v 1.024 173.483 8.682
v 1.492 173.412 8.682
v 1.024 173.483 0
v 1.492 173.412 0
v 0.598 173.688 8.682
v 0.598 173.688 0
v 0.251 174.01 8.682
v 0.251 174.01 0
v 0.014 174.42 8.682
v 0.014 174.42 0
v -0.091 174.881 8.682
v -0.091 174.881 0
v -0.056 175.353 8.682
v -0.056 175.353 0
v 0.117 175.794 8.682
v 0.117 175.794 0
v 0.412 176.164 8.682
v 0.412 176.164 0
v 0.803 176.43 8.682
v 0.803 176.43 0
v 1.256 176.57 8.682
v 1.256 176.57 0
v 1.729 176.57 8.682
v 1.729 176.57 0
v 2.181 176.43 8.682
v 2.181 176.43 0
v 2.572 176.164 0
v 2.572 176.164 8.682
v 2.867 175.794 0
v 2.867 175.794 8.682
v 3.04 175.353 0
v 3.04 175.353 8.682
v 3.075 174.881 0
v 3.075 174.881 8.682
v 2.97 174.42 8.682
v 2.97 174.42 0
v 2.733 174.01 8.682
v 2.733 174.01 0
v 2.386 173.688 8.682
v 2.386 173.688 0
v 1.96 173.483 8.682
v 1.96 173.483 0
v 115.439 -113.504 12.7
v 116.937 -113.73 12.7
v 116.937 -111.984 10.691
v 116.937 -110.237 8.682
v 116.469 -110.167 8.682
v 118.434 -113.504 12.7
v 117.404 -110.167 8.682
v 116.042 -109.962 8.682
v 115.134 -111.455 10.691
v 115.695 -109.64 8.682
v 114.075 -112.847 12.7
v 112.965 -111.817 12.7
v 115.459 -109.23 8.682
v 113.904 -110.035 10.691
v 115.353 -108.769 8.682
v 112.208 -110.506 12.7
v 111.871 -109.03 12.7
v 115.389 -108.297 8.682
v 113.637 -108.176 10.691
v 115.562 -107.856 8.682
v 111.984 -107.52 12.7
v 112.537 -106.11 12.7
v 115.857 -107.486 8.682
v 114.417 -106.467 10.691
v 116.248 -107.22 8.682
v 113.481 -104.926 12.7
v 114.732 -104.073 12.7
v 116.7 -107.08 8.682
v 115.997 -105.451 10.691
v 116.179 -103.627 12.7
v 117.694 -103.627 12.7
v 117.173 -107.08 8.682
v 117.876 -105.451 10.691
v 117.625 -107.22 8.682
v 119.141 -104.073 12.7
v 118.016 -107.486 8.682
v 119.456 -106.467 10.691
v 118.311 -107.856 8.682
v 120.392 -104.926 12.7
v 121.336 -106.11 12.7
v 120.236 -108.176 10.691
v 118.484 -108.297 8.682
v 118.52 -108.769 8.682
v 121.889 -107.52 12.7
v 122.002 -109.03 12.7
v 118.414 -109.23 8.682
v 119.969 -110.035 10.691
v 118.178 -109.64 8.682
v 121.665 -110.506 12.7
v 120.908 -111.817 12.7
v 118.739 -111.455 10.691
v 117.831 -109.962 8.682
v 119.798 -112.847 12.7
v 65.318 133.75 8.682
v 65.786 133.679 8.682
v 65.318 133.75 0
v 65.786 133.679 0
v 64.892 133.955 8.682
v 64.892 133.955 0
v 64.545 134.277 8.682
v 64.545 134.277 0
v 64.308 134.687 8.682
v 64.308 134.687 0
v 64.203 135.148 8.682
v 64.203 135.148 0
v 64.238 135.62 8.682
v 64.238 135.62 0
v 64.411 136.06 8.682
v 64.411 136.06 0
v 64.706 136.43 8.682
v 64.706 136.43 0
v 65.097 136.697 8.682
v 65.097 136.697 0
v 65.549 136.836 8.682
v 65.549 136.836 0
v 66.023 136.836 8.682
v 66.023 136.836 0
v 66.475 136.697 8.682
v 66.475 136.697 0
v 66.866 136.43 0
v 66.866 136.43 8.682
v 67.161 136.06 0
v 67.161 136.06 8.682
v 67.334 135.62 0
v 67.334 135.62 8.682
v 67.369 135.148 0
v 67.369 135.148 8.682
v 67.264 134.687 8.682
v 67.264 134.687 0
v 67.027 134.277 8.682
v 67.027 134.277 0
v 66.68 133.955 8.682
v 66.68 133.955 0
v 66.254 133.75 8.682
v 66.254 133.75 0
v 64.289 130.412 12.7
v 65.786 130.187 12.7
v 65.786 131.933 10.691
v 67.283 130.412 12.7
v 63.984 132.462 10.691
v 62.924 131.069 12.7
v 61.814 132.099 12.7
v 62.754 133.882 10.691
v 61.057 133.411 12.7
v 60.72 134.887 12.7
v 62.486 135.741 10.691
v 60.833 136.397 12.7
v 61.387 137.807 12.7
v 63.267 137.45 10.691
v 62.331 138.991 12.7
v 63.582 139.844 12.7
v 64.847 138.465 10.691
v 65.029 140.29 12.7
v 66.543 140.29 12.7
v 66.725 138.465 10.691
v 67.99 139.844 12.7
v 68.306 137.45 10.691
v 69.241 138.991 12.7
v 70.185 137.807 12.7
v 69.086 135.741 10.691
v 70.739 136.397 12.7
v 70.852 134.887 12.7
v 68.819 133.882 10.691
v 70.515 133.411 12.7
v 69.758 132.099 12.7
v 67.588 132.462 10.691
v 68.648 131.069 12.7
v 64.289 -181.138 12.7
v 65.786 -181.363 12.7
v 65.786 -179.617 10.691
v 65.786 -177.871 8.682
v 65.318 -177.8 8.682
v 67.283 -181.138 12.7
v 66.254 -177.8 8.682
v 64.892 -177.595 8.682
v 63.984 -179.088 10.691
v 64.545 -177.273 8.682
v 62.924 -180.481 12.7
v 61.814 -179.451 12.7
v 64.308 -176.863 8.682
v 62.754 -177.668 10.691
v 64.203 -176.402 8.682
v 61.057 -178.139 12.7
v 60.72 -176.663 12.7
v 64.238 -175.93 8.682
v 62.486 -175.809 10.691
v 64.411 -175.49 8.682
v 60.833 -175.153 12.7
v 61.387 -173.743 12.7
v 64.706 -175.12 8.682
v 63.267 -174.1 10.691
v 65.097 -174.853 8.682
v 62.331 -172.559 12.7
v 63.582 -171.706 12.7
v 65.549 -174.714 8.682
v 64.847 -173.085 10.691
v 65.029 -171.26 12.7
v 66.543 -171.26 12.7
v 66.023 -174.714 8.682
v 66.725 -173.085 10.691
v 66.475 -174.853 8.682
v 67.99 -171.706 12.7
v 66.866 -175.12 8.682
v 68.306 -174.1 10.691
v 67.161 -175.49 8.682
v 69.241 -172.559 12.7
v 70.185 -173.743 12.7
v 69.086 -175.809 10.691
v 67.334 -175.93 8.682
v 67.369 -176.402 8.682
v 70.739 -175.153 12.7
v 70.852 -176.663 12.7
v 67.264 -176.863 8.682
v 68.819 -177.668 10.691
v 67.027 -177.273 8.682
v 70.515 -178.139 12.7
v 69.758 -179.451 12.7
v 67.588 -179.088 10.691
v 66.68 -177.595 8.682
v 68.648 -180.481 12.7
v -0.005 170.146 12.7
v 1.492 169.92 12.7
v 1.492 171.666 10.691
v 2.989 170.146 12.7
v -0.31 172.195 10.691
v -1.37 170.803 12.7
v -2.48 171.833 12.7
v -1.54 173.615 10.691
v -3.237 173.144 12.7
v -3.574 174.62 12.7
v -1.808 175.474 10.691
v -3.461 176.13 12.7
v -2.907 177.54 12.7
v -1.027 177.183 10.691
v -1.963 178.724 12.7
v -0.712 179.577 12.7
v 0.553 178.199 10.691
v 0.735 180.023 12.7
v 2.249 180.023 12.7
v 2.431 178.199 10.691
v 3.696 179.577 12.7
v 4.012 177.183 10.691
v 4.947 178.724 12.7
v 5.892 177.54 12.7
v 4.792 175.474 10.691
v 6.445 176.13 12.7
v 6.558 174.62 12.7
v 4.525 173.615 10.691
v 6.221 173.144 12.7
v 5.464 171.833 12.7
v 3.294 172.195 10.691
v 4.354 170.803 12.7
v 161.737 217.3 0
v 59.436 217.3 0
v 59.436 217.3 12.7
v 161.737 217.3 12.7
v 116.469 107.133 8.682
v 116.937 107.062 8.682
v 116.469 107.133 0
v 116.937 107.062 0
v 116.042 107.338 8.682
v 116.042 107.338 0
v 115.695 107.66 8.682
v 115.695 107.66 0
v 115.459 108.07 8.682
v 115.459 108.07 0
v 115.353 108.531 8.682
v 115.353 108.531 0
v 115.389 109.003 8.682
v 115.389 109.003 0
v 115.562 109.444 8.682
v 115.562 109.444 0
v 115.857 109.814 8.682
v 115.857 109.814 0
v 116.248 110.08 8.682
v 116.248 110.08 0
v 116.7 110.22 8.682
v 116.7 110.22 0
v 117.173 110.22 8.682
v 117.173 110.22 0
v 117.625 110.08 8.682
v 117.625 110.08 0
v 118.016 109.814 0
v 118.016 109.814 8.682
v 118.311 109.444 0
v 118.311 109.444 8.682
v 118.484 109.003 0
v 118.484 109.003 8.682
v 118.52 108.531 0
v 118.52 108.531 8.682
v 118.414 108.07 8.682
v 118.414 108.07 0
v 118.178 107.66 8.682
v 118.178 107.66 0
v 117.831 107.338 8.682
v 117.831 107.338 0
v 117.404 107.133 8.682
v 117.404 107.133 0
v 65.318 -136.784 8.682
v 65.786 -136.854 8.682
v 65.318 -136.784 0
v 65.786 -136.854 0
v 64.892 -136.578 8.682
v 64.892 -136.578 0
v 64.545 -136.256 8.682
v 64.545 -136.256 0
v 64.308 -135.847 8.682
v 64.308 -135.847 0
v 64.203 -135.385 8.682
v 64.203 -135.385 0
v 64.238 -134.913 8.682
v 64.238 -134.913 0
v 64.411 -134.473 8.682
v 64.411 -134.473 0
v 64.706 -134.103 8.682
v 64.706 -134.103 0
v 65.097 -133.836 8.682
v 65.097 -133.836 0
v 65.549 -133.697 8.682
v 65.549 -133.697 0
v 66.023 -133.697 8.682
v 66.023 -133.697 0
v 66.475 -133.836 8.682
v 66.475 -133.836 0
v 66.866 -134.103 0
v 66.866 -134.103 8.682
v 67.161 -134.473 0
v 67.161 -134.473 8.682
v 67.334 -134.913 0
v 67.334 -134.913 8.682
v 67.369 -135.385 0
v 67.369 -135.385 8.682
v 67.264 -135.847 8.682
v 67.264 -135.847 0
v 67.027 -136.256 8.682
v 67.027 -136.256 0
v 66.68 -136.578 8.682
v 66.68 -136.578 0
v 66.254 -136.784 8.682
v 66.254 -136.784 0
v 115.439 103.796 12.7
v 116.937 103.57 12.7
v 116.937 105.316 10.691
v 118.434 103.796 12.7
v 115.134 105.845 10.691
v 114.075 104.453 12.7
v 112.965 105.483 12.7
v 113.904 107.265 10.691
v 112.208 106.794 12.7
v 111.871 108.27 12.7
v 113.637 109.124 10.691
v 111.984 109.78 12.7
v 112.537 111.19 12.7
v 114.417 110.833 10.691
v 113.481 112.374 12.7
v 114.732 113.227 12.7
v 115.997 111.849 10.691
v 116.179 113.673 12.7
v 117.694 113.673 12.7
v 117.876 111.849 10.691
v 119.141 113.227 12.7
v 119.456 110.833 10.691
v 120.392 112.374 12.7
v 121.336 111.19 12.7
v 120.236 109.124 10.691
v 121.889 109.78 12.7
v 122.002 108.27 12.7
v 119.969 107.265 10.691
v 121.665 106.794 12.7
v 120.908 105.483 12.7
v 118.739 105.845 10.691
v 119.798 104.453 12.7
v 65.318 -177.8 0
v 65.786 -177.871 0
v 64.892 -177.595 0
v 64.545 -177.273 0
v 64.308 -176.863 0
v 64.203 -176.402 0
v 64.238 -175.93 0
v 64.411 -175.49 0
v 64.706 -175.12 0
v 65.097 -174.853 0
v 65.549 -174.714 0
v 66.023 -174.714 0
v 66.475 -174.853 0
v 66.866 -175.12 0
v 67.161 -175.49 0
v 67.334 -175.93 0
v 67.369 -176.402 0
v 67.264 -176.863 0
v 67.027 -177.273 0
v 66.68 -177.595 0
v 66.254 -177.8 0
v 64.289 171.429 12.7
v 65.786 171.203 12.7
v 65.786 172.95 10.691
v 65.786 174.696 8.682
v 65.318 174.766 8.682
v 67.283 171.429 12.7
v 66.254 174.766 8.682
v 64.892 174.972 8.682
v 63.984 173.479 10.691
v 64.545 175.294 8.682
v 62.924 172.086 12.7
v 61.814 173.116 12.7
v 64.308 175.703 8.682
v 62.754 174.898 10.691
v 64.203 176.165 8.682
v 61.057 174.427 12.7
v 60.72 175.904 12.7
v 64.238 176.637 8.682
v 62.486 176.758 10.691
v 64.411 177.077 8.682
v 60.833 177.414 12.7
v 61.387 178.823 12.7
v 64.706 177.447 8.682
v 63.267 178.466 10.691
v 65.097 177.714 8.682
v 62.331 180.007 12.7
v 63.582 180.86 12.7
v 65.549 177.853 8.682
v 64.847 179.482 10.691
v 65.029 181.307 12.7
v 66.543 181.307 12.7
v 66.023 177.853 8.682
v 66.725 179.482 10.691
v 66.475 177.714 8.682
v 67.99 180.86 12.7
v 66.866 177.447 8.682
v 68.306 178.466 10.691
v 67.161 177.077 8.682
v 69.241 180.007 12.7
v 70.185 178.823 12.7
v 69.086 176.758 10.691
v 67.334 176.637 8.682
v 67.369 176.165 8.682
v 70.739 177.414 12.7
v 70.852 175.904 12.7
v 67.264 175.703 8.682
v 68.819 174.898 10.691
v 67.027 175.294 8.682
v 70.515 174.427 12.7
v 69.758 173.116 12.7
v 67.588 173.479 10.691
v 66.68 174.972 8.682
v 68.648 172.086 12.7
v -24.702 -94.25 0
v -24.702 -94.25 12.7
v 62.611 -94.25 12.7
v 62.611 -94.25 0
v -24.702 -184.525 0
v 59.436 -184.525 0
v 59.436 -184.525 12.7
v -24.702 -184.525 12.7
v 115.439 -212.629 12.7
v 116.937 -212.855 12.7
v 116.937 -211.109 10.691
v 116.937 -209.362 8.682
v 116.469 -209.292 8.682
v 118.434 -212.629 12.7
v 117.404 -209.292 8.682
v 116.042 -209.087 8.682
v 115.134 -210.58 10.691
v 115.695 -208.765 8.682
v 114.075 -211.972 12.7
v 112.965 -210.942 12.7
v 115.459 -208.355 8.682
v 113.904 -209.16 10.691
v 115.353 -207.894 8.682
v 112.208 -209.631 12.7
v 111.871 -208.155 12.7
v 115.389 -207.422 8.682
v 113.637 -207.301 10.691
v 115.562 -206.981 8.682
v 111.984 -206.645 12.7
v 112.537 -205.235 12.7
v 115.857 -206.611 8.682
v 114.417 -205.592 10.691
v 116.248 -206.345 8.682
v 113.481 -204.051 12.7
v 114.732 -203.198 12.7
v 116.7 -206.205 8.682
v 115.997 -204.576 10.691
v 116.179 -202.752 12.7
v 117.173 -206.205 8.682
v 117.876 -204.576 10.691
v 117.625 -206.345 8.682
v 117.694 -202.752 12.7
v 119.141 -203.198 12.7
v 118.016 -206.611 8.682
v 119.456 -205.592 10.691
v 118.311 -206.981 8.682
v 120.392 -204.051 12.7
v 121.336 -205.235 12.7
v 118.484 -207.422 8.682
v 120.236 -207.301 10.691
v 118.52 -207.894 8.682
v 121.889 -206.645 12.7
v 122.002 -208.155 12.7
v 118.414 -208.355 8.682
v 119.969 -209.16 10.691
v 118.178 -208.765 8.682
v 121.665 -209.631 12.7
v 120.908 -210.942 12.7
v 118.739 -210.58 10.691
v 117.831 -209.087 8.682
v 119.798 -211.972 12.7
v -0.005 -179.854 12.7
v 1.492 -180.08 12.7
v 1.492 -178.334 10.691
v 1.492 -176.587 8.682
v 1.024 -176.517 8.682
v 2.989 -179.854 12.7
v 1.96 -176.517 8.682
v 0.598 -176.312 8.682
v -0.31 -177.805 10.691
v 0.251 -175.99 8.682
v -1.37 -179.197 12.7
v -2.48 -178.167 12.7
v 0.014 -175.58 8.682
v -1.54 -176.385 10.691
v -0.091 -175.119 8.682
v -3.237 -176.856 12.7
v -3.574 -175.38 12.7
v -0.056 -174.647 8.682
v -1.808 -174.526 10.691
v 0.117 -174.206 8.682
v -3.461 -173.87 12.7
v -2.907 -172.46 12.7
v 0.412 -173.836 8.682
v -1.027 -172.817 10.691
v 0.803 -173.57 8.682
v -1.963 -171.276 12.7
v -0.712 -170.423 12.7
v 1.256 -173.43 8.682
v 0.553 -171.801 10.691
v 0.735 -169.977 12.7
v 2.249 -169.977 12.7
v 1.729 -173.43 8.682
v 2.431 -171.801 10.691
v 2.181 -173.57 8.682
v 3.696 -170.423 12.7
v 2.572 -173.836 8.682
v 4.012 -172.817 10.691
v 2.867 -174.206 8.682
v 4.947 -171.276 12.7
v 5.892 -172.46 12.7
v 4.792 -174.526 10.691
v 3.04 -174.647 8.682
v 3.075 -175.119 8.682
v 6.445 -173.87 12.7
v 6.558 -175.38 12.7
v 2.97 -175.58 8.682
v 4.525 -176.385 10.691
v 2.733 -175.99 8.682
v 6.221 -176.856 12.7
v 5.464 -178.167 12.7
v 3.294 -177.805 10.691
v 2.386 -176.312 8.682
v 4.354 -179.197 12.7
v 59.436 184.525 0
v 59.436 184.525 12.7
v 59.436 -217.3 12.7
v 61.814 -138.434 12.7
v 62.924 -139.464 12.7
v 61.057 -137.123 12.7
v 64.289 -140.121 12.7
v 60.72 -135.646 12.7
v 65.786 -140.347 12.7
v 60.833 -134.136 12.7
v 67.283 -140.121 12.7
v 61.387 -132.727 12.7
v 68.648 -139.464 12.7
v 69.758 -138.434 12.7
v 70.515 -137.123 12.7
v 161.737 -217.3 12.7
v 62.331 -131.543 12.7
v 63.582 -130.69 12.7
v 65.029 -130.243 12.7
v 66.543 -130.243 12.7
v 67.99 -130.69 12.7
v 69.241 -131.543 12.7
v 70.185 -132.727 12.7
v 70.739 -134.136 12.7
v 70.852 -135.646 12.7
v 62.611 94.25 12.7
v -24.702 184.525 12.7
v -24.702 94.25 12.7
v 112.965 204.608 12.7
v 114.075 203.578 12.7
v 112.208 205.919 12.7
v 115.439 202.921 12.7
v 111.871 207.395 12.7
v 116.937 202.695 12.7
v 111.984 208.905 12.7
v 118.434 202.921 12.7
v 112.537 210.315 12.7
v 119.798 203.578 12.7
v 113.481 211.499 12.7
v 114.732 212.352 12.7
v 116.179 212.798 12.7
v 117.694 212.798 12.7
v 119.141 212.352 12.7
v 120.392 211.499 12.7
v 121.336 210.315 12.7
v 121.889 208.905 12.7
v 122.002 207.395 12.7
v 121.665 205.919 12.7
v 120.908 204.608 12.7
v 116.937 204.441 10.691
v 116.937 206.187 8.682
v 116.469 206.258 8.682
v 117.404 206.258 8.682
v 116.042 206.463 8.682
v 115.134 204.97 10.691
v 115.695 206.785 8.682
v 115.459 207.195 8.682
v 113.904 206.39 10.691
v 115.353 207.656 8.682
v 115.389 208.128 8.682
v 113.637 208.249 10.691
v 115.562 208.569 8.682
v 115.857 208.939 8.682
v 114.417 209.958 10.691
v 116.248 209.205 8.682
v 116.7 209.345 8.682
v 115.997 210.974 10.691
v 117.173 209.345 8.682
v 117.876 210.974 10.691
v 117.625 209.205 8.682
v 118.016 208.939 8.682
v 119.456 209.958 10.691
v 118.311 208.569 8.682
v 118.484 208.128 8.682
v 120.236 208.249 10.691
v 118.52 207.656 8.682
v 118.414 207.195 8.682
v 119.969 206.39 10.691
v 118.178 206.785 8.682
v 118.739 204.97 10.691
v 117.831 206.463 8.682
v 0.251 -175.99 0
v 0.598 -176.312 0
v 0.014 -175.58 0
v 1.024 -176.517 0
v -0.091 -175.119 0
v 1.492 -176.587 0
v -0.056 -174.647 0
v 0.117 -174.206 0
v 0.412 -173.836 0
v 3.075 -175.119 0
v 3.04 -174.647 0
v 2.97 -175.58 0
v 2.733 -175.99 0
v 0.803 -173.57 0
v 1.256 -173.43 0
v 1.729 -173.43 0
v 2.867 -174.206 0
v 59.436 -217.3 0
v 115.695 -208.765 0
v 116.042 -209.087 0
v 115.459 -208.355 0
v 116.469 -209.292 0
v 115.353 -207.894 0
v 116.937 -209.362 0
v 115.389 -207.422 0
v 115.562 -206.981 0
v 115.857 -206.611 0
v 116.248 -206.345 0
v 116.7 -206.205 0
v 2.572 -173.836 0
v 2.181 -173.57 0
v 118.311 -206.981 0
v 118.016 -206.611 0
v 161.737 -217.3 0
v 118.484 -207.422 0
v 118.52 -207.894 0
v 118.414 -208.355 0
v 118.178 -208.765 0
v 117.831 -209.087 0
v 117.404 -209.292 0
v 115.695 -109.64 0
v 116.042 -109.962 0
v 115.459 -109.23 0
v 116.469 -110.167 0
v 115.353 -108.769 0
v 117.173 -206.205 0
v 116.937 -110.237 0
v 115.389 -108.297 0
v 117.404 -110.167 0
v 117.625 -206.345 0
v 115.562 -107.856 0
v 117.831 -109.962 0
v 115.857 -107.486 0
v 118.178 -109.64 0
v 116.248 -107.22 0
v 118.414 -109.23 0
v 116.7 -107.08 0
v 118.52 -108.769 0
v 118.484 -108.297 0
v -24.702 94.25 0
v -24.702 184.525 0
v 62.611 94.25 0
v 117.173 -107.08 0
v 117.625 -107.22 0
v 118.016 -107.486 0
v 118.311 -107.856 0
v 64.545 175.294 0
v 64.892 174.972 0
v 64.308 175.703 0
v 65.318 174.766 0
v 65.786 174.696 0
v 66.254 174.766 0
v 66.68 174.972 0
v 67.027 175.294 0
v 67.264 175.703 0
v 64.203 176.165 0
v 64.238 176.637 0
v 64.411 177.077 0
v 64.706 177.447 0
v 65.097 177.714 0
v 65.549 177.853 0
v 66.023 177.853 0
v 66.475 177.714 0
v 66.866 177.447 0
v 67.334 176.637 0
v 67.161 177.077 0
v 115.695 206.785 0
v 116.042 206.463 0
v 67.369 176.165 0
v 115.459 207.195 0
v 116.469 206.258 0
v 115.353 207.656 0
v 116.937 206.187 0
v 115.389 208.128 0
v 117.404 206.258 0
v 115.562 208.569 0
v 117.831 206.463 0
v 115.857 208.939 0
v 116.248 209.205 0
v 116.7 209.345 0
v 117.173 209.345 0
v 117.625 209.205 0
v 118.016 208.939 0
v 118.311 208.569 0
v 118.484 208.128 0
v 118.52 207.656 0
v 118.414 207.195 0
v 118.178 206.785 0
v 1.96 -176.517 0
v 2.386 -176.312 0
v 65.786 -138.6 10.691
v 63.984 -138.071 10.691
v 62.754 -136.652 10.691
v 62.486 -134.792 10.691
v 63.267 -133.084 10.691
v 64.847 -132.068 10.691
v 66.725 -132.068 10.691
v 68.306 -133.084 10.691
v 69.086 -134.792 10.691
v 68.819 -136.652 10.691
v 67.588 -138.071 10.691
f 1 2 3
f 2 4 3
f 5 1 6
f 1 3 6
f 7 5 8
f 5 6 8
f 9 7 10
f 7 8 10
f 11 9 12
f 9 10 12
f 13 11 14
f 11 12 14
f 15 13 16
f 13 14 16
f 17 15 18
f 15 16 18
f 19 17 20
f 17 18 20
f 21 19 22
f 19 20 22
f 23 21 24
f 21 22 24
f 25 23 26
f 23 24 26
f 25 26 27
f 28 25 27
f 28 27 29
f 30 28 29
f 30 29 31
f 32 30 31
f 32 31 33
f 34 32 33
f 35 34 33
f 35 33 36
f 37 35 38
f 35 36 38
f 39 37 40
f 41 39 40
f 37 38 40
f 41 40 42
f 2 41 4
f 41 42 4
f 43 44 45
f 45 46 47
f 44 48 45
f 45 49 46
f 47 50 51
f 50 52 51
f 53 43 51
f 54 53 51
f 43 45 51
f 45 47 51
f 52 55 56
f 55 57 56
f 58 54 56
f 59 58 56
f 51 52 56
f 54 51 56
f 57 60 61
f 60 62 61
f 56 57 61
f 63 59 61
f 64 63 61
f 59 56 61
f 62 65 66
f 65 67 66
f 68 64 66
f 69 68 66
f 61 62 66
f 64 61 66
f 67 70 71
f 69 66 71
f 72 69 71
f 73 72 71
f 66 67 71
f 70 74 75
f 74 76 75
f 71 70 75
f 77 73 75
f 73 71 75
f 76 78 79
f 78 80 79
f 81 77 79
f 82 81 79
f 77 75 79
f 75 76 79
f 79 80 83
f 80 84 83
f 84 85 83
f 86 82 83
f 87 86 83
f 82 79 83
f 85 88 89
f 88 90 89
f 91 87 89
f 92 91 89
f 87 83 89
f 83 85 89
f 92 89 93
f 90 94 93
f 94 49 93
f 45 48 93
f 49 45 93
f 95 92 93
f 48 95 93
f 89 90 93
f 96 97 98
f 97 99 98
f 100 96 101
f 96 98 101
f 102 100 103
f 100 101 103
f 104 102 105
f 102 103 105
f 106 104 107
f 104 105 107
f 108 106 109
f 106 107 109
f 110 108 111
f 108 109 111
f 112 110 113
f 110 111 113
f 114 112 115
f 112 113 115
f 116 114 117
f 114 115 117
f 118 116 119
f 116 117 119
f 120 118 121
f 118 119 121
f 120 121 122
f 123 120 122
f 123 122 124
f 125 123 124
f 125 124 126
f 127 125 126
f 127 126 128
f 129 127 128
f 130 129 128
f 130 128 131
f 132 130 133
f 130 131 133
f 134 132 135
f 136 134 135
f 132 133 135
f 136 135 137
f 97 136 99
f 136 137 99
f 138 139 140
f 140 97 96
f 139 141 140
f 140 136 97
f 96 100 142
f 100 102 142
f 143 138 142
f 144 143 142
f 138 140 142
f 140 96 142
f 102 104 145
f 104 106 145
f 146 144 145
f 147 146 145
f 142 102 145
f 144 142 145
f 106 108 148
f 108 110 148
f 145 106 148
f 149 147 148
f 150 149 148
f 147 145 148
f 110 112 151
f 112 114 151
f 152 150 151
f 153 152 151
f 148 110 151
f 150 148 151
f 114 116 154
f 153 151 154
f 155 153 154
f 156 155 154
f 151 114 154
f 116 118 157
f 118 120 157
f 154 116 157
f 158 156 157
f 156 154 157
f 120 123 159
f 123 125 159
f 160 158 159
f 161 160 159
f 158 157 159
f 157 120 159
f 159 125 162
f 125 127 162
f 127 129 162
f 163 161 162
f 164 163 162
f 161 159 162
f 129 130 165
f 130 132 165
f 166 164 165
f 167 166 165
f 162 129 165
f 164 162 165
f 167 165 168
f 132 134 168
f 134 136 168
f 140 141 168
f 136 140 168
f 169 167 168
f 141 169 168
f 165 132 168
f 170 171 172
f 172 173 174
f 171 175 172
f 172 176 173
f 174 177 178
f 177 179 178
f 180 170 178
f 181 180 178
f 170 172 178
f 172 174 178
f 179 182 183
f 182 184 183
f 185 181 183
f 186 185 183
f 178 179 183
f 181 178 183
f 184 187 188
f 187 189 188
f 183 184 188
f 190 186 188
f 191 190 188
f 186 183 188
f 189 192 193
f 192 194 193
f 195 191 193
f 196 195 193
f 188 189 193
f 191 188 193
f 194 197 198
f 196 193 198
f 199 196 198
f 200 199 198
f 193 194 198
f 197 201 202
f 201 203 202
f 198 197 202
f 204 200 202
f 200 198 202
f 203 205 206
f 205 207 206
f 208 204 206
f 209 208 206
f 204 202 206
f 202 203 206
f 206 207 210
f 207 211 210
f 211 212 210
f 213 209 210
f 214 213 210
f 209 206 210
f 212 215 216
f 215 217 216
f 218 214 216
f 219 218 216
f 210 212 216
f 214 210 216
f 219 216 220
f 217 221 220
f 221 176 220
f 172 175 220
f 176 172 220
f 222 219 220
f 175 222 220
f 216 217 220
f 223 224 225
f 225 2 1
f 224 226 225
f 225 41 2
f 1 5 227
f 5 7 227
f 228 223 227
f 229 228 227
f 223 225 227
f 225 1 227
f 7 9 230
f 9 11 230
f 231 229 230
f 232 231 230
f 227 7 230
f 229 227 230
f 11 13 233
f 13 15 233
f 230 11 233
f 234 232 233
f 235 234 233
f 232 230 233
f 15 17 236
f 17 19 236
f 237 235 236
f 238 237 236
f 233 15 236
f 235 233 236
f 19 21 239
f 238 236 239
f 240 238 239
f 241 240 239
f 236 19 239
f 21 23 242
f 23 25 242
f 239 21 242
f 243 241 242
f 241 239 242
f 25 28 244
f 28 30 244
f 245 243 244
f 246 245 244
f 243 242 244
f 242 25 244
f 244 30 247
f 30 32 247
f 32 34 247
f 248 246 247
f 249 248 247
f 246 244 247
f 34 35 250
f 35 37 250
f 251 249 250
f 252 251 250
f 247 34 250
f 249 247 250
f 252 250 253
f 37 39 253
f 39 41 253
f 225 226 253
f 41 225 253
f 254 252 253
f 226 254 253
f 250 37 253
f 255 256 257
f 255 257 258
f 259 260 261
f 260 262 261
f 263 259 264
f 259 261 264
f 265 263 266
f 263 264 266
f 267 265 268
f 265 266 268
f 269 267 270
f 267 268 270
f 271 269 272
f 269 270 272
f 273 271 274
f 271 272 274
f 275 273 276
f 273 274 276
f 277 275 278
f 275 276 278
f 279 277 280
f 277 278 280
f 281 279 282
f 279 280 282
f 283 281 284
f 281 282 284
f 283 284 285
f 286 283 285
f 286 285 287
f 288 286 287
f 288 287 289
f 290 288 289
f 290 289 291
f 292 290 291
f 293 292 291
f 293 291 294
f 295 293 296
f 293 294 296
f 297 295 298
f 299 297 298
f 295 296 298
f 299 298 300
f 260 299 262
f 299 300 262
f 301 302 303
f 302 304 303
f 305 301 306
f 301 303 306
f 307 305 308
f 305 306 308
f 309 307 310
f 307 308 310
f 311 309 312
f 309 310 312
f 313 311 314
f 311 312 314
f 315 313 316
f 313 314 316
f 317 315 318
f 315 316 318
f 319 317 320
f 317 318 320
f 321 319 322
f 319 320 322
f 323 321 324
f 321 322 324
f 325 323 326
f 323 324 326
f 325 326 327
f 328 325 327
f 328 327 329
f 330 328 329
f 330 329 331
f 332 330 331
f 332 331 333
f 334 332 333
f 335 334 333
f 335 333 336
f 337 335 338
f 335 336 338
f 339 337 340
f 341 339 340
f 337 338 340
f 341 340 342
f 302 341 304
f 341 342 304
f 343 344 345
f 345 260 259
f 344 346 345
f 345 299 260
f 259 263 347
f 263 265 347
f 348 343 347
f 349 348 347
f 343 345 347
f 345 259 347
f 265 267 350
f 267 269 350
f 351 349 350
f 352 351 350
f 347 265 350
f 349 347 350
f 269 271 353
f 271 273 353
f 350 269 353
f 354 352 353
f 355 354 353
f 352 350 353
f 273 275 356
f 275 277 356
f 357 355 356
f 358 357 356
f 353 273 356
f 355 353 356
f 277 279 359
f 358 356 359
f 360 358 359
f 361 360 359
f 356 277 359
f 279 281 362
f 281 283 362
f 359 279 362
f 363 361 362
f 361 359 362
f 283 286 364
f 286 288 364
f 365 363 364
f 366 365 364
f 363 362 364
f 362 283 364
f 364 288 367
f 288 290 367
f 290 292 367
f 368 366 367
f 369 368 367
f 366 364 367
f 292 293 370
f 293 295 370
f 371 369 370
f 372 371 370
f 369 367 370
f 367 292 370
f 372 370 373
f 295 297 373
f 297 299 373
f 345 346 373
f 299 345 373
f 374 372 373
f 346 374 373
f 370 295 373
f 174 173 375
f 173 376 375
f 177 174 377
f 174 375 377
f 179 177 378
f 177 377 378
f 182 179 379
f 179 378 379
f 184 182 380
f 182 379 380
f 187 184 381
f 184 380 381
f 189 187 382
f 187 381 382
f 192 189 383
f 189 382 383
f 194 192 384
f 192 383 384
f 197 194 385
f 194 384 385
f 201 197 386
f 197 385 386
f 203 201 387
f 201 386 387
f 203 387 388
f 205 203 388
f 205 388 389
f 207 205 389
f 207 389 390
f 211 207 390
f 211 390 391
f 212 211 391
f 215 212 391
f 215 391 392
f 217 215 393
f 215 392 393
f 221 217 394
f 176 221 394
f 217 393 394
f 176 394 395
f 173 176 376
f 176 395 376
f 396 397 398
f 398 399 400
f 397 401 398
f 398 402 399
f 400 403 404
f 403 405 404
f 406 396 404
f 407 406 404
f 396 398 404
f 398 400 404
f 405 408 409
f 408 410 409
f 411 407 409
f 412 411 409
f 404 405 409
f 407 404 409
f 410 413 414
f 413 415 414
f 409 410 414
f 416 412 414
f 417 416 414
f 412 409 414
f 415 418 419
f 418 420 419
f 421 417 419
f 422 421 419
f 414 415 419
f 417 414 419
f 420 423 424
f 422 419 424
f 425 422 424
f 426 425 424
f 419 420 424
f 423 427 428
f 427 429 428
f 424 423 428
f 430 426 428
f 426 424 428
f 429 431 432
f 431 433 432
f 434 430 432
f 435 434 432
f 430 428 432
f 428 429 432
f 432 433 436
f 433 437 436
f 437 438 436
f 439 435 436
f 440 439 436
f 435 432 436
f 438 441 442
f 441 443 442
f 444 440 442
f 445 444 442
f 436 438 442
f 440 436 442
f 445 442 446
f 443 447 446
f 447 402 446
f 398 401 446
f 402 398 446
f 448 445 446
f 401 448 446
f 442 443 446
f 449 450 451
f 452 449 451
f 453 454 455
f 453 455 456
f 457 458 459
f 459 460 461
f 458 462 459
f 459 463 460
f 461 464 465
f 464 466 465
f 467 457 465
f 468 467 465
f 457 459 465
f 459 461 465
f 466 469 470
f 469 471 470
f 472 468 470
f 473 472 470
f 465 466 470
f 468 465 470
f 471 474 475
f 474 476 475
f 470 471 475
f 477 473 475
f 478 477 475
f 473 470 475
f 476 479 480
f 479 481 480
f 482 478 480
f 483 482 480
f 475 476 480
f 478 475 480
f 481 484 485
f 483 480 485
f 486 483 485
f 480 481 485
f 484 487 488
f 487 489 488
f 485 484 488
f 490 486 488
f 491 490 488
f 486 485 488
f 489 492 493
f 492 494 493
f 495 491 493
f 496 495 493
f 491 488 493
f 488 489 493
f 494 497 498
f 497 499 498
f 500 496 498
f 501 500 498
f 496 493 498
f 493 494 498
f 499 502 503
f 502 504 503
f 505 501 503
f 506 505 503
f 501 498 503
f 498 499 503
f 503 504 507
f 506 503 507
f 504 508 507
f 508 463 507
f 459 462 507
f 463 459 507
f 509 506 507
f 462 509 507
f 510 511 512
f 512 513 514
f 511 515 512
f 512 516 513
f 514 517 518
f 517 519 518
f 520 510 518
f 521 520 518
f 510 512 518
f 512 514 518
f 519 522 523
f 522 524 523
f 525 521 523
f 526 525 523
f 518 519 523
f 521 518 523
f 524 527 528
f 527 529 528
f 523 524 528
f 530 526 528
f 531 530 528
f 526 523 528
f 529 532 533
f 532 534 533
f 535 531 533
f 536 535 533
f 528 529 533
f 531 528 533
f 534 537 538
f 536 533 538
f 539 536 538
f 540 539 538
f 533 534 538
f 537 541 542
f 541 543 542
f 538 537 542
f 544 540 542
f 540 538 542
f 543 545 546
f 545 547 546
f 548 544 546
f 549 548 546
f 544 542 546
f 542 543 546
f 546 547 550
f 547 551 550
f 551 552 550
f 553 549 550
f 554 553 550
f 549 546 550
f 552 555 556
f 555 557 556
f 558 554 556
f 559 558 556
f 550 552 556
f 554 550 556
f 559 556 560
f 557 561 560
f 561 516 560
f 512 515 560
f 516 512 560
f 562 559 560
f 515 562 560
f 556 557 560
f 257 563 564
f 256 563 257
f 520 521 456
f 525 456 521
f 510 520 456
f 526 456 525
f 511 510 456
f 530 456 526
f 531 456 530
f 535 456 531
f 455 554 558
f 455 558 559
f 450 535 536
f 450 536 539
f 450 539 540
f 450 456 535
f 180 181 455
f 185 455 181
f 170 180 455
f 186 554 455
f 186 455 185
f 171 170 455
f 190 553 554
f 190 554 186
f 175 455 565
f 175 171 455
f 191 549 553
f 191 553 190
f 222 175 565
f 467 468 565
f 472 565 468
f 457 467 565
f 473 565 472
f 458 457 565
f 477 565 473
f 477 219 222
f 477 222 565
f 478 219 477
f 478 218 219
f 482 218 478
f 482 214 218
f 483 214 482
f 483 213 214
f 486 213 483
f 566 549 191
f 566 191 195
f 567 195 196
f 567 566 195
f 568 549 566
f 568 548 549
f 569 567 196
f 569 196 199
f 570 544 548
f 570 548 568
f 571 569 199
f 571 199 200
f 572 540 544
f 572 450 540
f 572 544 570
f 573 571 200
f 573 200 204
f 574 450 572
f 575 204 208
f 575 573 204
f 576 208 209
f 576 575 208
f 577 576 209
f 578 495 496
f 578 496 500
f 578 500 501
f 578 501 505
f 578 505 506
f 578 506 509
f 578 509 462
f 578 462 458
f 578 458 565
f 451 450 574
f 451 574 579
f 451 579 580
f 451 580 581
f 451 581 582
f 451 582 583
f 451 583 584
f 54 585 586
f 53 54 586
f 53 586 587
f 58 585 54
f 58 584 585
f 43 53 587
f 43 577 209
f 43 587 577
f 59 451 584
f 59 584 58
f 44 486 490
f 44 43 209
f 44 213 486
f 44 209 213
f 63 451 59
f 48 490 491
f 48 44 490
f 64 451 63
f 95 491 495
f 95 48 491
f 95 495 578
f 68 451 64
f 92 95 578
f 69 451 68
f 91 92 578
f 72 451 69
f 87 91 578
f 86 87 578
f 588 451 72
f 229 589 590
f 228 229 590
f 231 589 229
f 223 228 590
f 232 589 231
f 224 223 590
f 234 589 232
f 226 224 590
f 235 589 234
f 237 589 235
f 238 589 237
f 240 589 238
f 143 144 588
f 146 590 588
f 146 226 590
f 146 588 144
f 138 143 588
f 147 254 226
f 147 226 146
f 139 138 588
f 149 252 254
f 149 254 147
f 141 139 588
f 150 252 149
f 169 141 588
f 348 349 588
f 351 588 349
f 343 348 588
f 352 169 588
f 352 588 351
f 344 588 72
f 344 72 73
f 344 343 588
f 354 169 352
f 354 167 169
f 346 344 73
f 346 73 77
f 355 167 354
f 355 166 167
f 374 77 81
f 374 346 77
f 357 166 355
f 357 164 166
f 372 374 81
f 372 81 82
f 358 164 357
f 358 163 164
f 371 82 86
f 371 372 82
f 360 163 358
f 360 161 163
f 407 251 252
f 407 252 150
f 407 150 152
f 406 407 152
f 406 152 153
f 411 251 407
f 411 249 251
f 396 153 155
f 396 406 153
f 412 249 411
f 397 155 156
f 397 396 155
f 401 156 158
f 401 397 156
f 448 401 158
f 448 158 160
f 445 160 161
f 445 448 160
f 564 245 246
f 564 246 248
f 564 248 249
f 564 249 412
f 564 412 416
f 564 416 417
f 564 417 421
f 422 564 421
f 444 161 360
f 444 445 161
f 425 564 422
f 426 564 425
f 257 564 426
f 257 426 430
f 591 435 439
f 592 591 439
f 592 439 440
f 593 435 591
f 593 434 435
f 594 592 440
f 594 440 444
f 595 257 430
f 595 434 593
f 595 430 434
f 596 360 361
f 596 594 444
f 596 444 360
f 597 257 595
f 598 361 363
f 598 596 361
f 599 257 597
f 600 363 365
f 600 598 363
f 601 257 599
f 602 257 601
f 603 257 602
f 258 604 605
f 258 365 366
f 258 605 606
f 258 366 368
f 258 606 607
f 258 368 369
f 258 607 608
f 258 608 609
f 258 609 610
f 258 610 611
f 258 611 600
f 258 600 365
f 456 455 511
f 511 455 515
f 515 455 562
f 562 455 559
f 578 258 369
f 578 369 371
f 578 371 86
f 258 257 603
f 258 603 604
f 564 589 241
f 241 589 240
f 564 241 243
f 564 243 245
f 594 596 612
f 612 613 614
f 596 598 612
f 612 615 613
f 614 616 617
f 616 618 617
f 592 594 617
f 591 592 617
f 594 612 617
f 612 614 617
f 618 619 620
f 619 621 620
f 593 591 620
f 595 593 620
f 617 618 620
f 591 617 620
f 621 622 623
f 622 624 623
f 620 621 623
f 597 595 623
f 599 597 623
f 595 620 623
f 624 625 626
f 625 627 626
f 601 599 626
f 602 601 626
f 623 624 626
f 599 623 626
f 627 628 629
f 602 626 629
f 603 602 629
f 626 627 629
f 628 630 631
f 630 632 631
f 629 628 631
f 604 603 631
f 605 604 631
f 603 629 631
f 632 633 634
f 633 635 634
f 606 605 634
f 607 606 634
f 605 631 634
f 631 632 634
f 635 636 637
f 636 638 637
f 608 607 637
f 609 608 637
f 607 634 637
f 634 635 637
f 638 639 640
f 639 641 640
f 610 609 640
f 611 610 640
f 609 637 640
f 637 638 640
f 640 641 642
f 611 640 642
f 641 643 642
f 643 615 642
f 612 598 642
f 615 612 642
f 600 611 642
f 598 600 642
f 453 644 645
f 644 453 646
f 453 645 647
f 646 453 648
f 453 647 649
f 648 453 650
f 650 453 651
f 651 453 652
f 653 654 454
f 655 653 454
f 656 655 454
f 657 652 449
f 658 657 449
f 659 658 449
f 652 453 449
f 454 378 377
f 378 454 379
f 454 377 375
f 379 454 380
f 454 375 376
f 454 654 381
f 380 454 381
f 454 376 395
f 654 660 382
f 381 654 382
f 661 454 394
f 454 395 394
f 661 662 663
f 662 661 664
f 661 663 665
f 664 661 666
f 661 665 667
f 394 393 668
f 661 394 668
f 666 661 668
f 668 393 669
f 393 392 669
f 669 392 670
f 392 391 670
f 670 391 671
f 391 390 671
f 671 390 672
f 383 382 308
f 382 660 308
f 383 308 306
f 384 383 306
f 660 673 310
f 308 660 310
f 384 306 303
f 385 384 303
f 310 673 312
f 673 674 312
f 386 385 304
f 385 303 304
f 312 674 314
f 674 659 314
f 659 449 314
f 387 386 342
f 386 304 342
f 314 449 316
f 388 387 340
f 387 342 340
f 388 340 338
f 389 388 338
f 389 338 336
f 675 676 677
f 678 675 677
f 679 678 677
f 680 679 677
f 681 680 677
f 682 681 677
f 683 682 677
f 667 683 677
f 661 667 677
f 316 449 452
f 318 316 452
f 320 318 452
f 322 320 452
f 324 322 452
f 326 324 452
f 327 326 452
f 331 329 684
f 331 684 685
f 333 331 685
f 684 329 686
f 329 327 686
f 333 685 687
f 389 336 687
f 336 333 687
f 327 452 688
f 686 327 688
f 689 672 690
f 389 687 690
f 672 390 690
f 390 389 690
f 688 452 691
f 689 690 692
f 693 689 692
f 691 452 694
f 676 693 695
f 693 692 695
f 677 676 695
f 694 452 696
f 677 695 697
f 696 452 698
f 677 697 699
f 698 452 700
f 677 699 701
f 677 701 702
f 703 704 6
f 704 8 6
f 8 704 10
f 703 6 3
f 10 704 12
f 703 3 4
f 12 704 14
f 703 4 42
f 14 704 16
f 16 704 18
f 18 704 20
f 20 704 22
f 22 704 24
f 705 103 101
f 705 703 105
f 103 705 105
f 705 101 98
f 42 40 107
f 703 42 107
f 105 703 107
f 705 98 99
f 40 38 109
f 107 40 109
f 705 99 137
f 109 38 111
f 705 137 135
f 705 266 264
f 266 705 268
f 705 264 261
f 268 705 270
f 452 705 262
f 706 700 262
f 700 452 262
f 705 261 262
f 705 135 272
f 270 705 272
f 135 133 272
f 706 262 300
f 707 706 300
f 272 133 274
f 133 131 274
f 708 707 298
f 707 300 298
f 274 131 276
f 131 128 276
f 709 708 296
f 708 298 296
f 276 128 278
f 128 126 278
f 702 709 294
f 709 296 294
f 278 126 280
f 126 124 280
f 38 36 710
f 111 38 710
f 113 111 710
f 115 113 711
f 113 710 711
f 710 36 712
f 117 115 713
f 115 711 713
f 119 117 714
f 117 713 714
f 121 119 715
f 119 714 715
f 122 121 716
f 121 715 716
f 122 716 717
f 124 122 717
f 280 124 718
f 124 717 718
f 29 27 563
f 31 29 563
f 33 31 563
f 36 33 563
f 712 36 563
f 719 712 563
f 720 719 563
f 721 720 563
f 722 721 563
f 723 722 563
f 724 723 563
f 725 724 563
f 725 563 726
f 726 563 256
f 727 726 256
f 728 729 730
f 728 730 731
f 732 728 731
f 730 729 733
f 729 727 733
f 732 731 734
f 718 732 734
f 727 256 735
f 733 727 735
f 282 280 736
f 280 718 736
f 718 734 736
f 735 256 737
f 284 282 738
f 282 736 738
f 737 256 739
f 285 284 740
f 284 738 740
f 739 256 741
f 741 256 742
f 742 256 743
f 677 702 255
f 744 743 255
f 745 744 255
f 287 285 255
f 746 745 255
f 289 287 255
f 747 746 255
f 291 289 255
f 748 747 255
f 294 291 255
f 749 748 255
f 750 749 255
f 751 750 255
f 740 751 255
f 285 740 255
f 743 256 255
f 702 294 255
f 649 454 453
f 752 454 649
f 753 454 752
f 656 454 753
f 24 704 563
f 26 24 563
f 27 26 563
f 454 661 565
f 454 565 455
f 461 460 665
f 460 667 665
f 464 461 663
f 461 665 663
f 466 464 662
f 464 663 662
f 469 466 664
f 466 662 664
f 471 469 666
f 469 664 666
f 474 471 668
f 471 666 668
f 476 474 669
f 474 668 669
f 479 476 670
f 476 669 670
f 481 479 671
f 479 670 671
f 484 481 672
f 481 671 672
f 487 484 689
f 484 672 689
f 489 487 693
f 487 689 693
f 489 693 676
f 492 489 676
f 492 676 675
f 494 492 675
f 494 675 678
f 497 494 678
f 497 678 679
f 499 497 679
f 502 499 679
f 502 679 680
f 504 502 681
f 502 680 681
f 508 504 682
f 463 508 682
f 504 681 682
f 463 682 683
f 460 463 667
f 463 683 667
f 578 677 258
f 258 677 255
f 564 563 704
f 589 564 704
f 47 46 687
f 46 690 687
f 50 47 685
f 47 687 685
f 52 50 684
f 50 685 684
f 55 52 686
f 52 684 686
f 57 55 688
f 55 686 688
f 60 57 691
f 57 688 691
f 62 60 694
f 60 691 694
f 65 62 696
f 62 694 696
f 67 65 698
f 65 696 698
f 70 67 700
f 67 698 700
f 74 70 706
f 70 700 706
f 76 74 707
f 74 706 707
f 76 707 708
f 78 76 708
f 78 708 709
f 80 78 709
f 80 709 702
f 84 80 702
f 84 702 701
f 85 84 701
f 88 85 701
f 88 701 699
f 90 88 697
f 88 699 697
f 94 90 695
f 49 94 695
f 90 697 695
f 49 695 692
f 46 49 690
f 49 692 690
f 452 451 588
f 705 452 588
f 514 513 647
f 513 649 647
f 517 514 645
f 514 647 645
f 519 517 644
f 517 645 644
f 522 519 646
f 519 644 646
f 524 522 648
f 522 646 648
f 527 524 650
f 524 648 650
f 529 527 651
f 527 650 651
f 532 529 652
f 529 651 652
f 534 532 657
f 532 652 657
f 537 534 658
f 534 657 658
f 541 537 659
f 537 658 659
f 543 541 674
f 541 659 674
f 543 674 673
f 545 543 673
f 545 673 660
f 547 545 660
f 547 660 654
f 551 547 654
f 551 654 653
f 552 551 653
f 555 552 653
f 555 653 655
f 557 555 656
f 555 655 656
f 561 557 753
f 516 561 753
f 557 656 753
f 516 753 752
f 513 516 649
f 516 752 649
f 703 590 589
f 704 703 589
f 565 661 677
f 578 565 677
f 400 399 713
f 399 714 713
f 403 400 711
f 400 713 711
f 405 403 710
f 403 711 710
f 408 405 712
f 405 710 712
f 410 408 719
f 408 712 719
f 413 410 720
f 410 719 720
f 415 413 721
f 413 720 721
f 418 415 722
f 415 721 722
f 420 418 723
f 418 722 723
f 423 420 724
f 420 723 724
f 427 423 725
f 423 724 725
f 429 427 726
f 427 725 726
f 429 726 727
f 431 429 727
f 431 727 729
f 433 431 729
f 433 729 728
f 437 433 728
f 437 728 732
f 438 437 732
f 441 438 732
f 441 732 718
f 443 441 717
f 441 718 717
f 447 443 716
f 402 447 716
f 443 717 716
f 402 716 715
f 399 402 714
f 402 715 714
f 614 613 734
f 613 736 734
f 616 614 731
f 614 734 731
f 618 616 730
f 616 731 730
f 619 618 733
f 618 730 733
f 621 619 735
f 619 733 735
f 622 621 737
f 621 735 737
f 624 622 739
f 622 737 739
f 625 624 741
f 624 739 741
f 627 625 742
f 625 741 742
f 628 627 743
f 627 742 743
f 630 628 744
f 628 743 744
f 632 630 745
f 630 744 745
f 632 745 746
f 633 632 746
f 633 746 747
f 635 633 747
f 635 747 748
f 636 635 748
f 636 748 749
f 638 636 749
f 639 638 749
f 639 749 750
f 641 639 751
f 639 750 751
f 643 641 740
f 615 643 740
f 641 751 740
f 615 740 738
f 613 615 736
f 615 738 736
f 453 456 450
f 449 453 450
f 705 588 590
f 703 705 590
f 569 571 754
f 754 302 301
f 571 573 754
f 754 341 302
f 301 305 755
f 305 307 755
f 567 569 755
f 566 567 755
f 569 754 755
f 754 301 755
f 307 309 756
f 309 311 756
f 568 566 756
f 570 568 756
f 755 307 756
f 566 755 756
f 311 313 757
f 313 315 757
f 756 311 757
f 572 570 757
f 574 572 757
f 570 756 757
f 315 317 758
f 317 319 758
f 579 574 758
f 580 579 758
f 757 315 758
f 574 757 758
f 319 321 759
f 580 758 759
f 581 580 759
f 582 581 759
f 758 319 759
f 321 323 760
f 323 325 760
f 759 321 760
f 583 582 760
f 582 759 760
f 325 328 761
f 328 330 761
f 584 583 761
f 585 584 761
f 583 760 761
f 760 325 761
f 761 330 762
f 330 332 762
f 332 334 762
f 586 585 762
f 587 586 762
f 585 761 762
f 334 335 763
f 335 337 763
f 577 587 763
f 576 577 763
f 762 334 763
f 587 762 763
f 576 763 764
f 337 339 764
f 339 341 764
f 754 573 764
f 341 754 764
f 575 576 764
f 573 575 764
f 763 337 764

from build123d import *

# Parameters (mm, degrees)
SKETCH1_W           = 243.588796282
SKETCH1_H           = 434.599999988
BOSS_EXTRUDE1_DEPTH = 12.7
CUT_EXTRUDE1_REACH  = 273.182
SKETCH2_W           = 141.287862113
SKETCH2_H           = 32.775
CUT_EXTRUDE2_REACH  = 273.182
HOLE1_D             = 3.175
HOLE1_DEPTH         = 38.1
HOLE1_CSINK_D       = 10.16
HOLE1_CSINK_ANGLE   = 82
HOLE1_TIP           = 0.953866233
CUT_EXTRUDE3_REACH  = 273.182
SKETCH6_W           = 31.75
SKETCH6_H           = 90.274999997


with BuildPart() as part:
    # Sketch1 → Boss-Extrude1 (new body)
    with BuildSketch(Plane.XY):
        with Locations((39.942597436, 0)):
            Rectangle(SKETCH1_W, SKETCH1_H)
    extrude(amount=BOSS_EXTRUDE1_DEPTH)

    # Sketch2 → Cut-Extrude1 (cut, up to next)
    with BuildSketch(Plane(origin=(0, 0, 0), x_dir=(-1, 0, 0), z_dir=(0, 0, -1)), mode=Mode.PRIVATE) as cut_extrude1_sk1:
        with Locations((11.207869649, 200.912499994)):
            Rectangle(SKETCH2_W, SKETCH2_H)
    cut_extrude1_tool1 = extrude(cut_extrude1_sk1.sketch, amount=-CUT_EXTRUDE1_REACH, mode=Mode.PRIVATE) & part.part
    # Sketch2 → Cut-Extrude1 (cut, up to next)
    with BuildSketch(Plane(origin=(0, 0, 0), x_dir=(-1, 0, 0), z_dir=(0, 0, -1)), mode=Mode.PRIVATE) as cut_extrude1_sk2:
        with Locations((11.207869649, -200.912499994)):
            Rectangle(SKETCH2_W, SKETCH2_H)
    cut_extrude1_tool2 = extrude(cut_extrude1_sk2.sketch, amount=-CUT_EXTRUDE1_REACH, mode=Mode.PRIVATE) & part.part
    add(cut_extrude1_tool1.solids().sort_by_distance((-11.20787, 200.9125, 0))[0], mode=Mode.SUBTRACT)
    add(cut_extrude1_tool2.solids().sort_by_distance((-11.20787, -200.9125, 0))[0], mode=Mode.SUBTRACT)

    # Sketch3 → Cut-Extrude2 (cut, up to next)
    with BuildSketch(Plane.XY.offset(12.7), mode=Mode.PRIVATE) as cut_extrude2_sk1:
        Polygon((62.611061408, 94.249999997), (-56.451800705, 94.249999997), (-56.451800705, 184.524999994), (-81.851800705, 184.524999994), (-81.851800705, 94.249999997), (-85.026800705, 94.249999997), (-85.026800705, -94.249999997), (-81.851800705, -94.249999997), (-81.851800705, -184.524999994), (-56.451800705, -184.524999994), (-56.451800705, -94.249999997), (62.611061408, -94.249999997), align=None)
    cut_extrude2_tool1 = extrude(cut_extrude2_sk1.sketch, amount=-CUT_EXTRUDE2_REACH, mode=Mode.PRIVATE) & part.part
    add(cut_extrude2_tool1.solids().sort_by_distance((-19.405412, 0, 12.7))[0], mode=Mode.SUBTRACT)

    # Hole1
    with Locations(Plane(origin=(449.828463103, 0, 12.7), x_dir=(0, 1, 0), z_dir=(0, 0, 1))):
        with Locations((-108.649999997, 332.89193461), (108.649999997, 332.89193461), (207.774999994, 332.89193461), (174.999999994, 448.336332751), (135.266666663, 384.042401694), (176.283333328, 384.042401694), (-174.999999994, 448.336332751), (-135.266666663, 384.042401694), (-176.283333328, 384.042401694), (-207.774999994, 332.89193461)):
            CounterSinkHole(HOLE1_D / 2, HOLE1_CSINK_D / 2, depth=HOLE1_DEPTH, counter_sink_angle=HOLE1_CSINK_ANGLE)
            with Locations((0, 0, -(HOLE1_DEPTH + HOLE1_TIP / 2))):  # 118° drill point
                Cone(0, HOLE1_D / 2, HOLE1_TIP, mode=Mode.SUBTRACT)

    # Sketch6 → Cut-Extrude3 (cut, up to next)
    with BuildSketch(Plane.XY.offset(12.7), mode=Mode.PRIVATE) as cut_extrude3_sk1:
        with Locations((-40.576800705, 139.387499996)):
            Rectangle(SKETCH6_W, SKETCH6_H)
    cut_extrude3_tool1 = extrude(cut_extrude3_sk1.sketch, amount=-CUT_EXTRUDE3_REACH, mode=Mode.PRIVATE) & part.part
    # Sketch6 → Cut-Extrude3 (cut, up to next)
    with BuildSketch(Plane.XY.offset(12.7), mode=Mode.PRIVATE) as cut_extrude3_sk2:
        with Locations((-40.576800705, -139.387499996)):
            Rectangle(SKETCH6_W, SKETCH6_H)
    cut_extrude3_tool2 = extrude(cut_extrude3_sk2.sketch, amount=-CUT_EXTRUDE3_REACH, mode=Mode.PRIVATE) & part.part
    add(cut_extrude3_tool1.solids().sort_by_distance((-40.576801, 139.3875, 12.7))[0], mode=Mode.SUBTRACT)
    add(cut_extrude3_tool2.solids().sort_by_distance((-40.576801, -139.3875, 12.7))[0], mode=Mode.SUBTRACT)


solid = part.part
